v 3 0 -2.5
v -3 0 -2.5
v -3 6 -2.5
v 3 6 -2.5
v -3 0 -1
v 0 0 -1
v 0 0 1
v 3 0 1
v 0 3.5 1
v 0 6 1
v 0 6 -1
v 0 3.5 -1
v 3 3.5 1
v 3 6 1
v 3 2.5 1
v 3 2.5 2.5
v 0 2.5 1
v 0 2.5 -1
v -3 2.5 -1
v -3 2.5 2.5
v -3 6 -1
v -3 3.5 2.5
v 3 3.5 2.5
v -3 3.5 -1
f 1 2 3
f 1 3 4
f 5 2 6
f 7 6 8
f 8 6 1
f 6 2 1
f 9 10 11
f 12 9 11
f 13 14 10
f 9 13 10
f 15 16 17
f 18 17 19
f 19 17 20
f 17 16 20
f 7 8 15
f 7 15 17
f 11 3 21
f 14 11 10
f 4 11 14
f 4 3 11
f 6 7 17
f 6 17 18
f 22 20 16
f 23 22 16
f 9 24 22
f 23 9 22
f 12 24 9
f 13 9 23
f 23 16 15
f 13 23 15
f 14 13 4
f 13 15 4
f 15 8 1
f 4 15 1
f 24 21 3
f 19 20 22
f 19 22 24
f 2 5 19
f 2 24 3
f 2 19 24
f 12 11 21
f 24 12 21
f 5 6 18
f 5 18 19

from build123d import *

# Parameters (mm, degrees)
SKETCH1_W           = 6
SKETCH1_H           = 5
BOSS_EXTRUDE1_DEPTH = 6
CUT_EXTRUDE1_DEPTH  = 2.5
CUT_EXTRUDE2_DEPTH  = 2.5


with BuildPart() as part:
    # Sketch1 → Boss-Extrude1 (new body)
    with BuildSketch(Plane(origin=(0, 0, 0), x_dir=(1, 0, 0), z_dir=(0, 1, 0))):
        Rectangle(SKETCH1_W, SKETCH1_H)
    extrude(amount=BOSS_EXTRUDE1_DEPTH)

    # Sketch2 → Cut-Extrude1 (cut)
    with BuildSketch(Plane(origin=(0, 6, 0), x_dir=(1, 0, 0), z_dir=(0, 1, 0))):
        Polygon((3, -1), (0, -1), (0, 1), (-3, 1), (-3, -2.5), (3, -2.5), align=None)
    extrude(amount=-CUT_EXTRUDE1_DEPTH, mode=Mode.SUBTRACT)

    # Sketch3 → Cut-Extrude2 (cut)
    with BuildSketch(Plane.XZ):
        Polygon((3, 1), (0, 1), (0, -1), (-3, -1), (-3, 2.5), (3, 2.5), align=None)
    extrude(amount=-CUT_EXTRUDE2_DEPTH, mode=Mode.SUBTRACT)


solid = part.part
